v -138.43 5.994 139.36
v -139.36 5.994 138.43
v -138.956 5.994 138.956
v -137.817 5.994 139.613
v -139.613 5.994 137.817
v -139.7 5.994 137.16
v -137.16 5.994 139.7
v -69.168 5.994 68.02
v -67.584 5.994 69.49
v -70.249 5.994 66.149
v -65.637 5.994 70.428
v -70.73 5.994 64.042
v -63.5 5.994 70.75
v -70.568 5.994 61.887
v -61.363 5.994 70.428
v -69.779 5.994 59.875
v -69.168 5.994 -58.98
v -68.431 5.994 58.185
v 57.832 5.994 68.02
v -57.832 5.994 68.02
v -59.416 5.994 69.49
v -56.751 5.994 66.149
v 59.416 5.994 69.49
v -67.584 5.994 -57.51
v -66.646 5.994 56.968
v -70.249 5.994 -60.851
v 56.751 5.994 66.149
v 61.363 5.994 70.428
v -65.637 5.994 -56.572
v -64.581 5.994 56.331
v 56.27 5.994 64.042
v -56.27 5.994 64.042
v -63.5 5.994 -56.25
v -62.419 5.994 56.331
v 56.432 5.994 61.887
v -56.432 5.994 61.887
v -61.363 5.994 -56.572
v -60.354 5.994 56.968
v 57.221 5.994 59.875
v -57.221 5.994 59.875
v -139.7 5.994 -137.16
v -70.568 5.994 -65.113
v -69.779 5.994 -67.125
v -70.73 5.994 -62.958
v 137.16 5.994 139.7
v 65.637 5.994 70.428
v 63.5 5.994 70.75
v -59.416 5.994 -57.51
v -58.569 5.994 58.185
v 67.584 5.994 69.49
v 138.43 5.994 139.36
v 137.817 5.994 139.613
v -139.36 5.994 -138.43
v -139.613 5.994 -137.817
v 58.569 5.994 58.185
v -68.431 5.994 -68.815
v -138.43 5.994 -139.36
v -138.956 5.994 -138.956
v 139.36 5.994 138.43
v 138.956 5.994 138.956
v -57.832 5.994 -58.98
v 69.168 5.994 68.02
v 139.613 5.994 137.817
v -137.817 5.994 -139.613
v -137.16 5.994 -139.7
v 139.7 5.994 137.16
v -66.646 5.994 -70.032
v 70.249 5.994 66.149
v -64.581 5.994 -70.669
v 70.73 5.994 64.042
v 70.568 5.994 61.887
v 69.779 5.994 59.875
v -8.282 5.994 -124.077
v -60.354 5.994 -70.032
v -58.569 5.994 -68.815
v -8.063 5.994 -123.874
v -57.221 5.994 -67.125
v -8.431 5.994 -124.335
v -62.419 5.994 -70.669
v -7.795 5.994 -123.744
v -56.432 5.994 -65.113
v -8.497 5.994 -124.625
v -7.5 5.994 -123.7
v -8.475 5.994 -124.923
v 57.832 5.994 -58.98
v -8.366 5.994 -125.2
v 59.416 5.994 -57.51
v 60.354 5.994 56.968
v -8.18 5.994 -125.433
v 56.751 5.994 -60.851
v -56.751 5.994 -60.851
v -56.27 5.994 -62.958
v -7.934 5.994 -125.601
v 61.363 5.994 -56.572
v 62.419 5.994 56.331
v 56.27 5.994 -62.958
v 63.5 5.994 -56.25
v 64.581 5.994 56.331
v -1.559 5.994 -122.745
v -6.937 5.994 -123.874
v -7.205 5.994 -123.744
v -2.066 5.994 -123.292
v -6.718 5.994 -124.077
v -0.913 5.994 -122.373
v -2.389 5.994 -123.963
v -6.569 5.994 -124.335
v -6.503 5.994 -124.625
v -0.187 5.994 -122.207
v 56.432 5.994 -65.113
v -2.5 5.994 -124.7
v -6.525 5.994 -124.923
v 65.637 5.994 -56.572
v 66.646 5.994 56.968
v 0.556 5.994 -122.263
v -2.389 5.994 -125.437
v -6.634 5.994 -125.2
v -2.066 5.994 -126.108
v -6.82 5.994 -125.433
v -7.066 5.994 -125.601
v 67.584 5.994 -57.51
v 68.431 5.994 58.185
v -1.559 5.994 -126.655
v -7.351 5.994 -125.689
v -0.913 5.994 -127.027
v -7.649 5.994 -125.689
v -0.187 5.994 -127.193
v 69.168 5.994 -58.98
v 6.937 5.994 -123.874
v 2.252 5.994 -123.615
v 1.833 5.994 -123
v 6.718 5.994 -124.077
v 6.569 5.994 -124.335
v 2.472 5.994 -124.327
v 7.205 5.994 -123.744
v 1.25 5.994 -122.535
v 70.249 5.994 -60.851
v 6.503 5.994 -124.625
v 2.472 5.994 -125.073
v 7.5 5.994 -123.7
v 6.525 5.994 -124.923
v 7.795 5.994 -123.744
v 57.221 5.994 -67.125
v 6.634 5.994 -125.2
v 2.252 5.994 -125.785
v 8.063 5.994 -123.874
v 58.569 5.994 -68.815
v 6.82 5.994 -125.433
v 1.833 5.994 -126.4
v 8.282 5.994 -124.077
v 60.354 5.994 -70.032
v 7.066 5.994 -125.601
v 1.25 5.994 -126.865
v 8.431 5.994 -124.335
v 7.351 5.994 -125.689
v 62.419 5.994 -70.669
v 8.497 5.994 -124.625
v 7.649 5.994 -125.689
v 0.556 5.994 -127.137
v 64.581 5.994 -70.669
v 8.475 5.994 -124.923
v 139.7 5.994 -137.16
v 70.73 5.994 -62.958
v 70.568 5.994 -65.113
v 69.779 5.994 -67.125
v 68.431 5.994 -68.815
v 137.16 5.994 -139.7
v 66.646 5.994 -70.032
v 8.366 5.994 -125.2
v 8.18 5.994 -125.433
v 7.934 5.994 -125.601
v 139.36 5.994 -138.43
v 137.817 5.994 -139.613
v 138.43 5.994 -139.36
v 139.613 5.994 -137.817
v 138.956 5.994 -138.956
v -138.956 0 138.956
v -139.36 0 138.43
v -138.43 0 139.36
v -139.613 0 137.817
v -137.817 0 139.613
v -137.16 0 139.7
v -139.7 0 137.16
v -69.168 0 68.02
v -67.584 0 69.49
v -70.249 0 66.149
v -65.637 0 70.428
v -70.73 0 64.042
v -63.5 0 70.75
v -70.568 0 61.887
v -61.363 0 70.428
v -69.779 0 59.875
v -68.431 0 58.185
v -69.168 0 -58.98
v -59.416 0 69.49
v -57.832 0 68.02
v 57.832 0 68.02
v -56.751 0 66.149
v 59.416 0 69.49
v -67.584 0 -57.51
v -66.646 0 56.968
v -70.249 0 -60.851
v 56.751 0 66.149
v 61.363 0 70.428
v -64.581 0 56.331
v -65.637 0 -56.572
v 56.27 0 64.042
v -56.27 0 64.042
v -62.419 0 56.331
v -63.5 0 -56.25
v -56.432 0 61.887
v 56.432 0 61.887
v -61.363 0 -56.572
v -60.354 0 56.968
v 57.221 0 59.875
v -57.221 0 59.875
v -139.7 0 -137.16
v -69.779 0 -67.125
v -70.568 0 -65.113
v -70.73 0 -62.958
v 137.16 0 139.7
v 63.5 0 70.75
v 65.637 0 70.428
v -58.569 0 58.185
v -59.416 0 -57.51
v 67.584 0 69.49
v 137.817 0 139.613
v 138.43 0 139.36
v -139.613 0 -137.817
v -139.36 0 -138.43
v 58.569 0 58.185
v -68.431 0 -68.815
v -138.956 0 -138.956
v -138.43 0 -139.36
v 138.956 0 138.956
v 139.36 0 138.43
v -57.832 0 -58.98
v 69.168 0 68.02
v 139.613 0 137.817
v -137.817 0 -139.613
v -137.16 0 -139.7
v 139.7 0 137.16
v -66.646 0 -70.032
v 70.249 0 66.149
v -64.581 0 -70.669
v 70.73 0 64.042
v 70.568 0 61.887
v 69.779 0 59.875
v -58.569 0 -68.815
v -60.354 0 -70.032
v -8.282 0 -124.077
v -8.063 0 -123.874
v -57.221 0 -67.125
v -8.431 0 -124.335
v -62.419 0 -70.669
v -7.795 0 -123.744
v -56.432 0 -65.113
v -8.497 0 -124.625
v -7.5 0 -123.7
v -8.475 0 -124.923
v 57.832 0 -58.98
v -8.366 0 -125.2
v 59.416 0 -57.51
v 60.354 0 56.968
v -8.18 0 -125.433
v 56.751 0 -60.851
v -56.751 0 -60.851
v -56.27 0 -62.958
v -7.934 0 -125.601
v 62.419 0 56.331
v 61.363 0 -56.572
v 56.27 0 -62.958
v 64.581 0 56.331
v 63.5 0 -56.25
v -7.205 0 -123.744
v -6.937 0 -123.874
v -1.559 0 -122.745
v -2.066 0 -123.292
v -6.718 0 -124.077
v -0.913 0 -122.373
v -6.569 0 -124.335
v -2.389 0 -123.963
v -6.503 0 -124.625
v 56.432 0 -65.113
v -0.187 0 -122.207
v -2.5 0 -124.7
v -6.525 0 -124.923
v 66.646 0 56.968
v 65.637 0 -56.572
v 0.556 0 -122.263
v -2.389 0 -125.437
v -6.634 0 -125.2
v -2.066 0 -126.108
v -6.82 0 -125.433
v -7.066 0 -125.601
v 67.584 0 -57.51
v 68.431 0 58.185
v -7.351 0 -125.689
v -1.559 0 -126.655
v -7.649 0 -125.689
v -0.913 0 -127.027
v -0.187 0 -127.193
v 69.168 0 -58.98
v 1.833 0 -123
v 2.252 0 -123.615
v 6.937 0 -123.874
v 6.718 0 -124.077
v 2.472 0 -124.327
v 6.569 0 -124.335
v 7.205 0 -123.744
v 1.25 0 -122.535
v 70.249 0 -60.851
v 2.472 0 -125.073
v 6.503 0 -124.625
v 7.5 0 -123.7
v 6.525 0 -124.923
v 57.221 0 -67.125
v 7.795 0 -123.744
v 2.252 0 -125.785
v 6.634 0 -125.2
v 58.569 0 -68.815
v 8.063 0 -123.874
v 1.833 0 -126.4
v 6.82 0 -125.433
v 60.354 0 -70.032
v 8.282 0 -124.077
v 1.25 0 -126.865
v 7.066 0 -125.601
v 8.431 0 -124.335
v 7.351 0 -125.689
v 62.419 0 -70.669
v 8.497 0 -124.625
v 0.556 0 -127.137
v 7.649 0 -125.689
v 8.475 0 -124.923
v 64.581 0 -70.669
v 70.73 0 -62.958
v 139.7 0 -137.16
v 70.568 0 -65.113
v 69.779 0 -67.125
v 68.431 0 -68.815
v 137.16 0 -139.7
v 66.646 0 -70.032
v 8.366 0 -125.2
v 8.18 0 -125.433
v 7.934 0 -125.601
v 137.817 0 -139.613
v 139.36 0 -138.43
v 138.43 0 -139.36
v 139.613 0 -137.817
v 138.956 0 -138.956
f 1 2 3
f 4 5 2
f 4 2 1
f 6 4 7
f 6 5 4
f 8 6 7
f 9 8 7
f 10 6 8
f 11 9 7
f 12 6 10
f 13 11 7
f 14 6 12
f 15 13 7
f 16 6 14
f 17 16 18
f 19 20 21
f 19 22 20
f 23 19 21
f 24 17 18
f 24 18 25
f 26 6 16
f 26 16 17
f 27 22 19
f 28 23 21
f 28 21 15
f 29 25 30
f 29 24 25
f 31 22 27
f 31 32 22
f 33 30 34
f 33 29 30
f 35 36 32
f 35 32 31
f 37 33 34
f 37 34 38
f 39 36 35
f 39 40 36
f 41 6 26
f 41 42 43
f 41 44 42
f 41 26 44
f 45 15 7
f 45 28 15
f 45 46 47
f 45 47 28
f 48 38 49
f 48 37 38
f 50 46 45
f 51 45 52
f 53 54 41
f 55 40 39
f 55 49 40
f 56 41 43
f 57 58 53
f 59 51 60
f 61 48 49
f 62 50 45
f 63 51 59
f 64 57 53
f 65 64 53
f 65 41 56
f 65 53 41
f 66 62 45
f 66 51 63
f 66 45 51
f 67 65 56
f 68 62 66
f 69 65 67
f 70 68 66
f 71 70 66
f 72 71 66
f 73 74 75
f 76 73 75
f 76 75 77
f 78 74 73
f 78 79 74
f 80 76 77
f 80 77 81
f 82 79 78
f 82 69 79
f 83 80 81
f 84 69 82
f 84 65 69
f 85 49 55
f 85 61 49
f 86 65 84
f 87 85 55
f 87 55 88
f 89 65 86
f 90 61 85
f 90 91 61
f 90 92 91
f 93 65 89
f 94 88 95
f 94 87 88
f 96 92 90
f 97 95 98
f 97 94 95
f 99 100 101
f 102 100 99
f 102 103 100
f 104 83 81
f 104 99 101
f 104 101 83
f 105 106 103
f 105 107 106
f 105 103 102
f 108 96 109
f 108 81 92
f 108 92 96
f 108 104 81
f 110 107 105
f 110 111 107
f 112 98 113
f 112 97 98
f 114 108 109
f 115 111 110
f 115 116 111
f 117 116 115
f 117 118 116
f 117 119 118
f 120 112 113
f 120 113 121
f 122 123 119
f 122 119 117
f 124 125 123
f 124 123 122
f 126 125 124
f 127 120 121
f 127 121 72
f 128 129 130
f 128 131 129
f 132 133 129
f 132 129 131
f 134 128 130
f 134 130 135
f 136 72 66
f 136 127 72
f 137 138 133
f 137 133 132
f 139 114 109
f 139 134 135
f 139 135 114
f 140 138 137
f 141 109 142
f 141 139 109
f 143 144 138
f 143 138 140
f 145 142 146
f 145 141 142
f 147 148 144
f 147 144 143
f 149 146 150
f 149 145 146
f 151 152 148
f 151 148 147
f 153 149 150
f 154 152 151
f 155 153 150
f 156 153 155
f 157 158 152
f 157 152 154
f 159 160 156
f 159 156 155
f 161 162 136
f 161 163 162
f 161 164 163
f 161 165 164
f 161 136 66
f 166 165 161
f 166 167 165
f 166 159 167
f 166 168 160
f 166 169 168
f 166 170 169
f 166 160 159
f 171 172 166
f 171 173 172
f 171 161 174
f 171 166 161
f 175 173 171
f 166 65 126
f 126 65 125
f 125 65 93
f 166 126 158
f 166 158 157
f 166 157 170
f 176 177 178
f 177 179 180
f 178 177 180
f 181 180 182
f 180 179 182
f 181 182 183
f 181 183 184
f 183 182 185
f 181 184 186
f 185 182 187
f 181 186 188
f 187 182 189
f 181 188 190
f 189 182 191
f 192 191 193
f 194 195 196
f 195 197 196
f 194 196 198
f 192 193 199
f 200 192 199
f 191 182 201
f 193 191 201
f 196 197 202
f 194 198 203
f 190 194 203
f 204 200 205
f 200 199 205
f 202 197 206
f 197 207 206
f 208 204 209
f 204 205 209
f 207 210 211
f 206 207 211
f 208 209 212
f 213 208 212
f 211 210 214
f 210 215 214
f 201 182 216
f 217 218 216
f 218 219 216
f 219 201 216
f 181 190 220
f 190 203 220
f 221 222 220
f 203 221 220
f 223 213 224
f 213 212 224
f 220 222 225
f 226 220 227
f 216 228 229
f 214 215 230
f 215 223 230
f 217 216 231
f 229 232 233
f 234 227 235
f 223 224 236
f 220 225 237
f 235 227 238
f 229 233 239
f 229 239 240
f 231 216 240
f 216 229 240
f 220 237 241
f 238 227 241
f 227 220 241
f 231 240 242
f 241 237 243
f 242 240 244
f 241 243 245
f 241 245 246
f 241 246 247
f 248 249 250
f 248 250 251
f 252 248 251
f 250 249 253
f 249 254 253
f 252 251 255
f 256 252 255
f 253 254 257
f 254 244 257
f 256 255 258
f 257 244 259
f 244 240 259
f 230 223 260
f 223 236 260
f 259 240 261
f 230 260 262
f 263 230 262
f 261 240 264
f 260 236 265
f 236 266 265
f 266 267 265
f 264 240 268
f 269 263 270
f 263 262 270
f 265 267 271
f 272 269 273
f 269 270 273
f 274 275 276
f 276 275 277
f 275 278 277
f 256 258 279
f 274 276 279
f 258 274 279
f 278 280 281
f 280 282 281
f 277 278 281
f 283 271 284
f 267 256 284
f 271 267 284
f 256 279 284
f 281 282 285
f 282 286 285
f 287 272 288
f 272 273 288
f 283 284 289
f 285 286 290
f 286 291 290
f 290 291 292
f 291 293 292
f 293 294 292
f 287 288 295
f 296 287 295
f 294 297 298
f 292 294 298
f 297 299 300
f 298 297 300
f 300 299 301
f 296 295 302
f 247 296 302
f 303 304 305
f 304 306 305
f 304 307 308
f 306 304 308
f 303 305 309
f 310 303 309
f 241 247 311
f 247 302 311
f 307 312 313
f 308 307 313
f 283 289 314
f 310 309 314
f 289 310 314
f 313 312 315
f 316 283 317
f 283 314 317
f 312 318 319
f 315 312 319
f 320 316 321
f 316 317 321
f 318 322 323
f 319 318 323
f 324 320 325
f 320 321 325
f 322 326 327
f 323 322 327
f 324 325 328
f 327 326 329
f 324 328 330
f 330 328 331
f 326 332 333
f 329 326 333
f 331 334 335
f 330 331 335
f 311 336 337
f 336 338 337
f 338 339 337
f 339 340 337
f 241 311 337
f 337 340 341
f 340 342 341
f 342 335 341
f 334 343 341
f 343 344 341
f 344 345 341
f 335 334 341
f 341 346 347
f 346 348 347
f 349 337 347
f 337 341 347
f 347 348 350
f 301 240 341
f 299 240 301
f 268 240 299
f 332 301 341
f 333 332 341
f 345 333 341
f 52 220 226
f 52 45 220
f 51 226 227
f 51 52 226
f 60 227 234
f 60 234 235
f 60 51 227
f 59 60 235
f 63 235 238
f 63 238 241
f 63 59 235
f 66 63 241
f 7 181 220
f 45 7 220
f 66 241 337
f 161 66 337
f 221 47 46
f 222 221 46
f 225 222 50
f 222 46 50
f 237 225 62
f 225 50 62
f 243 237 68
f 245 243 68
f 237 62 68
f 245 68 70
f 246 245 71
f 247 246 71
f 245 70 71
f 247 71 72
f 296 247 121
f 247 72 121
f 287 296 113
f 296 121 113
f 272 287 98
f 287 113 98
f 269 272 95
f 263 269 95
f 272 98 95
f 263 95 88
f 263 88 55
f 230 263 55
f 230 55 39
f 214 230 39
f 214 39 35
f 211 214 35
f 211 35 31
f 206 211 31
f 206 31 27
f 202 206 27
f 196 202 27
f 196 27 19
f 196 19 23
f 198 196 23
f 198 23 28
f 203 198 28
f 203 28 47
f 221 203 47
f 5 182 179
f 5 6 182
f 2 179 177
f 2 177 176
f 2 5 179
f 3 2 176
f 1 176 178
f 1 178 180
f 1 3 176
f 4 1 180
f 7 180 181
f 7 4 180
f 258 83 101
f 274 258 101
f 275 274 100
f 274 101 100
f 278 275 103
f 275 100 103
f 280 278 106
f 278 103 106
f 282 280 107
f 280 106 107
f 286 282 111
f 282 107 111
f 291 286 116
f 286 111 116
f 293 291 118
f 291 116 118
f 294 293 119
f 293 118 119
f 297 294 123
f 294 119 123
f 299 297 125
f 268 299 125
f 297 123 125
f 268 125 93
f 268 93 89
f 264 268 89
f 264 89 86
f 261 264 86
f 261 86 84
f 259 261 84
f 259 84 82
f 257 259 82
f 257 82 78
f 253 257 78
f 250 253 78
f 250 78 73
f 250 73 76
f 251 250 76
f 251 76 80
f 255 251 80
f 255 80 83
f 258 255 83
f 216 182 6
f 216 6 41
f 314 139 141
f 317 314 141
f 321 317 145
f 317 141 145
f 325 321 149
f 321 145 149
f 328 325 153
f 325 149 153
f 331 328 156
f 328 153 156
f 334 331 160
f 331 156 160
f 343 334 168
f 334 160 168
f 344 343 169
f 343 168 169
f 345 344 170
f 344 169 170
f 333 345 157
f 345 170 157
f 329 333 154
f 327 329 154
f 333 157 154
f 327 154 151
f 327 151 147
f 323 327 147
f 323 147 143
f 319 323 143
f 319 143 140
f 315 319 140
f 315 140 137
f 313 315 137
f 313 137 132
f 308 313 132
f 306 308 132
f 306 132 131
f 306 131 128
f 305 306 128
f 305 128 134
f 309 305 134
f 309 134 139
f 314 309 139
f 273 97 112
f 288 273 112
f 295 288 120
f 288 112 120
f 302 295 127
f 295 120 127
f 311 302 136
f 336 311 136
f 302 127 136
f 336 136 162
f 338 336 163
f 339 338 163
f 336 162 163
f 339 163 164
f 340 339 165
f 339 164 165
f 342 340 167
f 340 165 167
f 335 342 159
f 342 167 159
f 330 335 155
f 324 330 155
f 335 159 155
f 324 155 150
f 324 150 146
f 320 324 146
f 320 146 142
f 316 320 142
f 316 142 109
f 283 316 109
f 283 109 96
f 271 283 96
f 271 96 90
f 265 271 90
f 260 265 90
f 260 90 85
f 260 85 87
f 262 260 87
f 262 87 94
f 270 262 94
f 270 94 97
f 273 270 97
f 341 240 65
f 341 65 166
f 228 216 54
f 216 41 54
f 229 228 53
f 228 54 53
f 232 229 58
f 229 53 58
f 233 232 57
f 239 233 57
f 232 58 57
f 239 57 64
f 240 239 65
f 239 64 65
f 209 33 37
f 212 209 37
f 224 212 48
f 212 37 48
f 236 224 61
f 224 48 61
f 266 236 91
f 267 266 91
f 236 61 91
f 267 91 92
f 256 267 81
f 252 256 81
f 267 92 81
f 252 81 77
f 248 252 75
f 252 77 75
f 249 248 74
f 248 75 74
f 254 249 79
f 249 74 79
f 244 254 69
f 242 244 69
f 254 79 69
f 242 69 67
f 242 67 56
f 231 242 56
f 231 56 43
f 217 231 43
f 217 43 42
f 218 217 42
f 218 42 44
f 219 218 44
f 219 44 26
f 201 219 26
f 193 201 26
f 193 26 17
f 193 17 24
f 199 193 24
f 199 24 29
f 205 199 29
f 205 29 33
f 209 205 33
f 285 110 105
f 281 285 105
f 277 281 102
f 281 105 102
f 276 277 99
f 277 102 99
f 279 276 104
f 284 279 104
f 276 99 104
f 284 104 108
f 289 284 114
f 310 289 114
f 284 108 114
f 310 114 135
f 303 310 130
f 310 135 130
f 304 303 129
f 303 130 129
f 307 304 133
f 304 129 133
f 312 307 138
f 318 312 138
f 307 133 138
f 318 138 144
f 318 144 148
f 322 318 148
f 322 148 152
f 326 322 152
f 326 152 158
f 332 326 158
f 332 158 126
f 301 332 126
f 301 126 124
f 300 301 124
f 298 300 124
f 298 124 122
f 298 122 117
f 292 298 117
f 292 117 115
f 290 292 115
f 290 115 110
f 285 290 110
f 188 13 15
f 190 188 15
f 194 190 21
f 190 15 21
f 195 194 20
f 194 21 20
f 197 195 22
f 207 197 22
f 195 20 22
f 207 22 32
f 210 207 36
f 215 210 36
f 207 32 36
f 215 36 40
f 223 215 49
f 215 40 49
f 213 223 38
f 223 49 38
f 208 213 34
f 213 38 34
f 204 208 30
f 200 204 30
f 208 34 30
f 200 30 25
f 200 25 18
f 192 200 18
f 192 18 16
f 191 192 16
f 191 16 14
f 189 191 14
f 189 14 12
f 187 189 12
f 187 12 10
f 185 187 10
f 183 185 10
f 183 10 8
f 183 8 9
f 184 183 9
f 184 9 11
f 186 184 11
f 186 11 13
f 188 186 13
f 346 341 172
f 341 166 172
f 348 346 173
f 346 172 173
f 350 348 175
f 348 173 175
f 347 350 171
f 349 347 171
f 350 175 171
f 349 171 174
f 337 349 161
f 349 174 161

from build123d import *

# Parameters (mm, degrees)
SKETCH1_W           = 279.4
SKETCH1_H           = 279.4
BOSS_EXTRUDE1_DEPTH = 5.9944
SKETCH2_R           = 7.25
CUT_EXTRUDE1_DEPTH  = 198.656552715
FILLET1_R           = 2.54
SKETCH3_R           = 1
CUT_EXTRUDE2_DEPTH  = 198.656552715


with BuildPart() as part:
    # Sketch1 → Boss-Extrude1 (new body)
    with BuildSketch(Plane(origin=(0, 0, 0), x_dir=(1, 0, 0), z_dir=(0, 1, 0))):
        Rectangle(SKETCH1_W, SKETCH1_H)
    extrude(amount=BOSS_EXTRUDE1_DEPTH)

    # Sketch2 → Cut-Extrude1 (cut, through all)
    with BuildSketch(Plane(origin=(0, 5.9944, 0), x_dir=(1, 0, 0), z_dir=(0, 1, 0))):
        with Locations(Location((-63.5, 63.5, 0), (0, 0, 270))):
            Circle(SKETCH2_R)
        with Locations(Location((63.5, 63.5, 0), (0, 0, 270))):
            Circle(SKETCH2_R)
        with Locations(Location((63.5, -63.5, 0), (0, 0, 270))):
            Circle(SKETCH2_R)
        with Locations(Location((-63.5, -63.5, 0), (0, 0, 270))):
            Circle(SKETCH2_R)
    extrude(amount=-CUT_EXTRUDE1_DEPTH, mode=Mode.SUBTRACT)

    # Fillet1
    fillet1_edges = [part.edges().sort_by_distance(p)[0] for p in [
        (139.7, 2.9972, 139.7),
        (-139.7, 2.9972, 139.7),
        (-139.7, 2.9972, -139.7),
        (139.7, 2.9972, -139.7),
    ]]
    fillet(fillet1_edges, radius=FILLET1_R)

    # Sketch3 → Cut-Extrude2 (cut, through all)
    with BuildSketch(Plane(origin=(0, 5.9944, 0), x_dir=(1, 0, 0), z_dir=(0, 1, 0))):
        with BuildLine():
            ThreePointArc((2.5, 124.7), (0, 127.2), (-2.5, 124.7))
            Line((-2.5, 124.7), (2.5, 124.7))
        make_face()
        with BuildLine():
            Line((2.5, 124.7), (-2.5, 124.7))
            ThreePointArc((-2.5, 124.7), (0, 122.2), (2.5, 124.7))
        make_face()
        with Locations(Location((7.5, 124.7, 0), (0, 0, 270))):
            Circle(SKETCH3_R)
        with Locations(Location((-7.5, 124.7, 0), (0, 0, 270))):
            Circle(SKETCH3_R)
    extrude(amount=-CUT_EXTRUDE2_DEPTH, mode=Mode.SUBTRACT)


solid = part.part
